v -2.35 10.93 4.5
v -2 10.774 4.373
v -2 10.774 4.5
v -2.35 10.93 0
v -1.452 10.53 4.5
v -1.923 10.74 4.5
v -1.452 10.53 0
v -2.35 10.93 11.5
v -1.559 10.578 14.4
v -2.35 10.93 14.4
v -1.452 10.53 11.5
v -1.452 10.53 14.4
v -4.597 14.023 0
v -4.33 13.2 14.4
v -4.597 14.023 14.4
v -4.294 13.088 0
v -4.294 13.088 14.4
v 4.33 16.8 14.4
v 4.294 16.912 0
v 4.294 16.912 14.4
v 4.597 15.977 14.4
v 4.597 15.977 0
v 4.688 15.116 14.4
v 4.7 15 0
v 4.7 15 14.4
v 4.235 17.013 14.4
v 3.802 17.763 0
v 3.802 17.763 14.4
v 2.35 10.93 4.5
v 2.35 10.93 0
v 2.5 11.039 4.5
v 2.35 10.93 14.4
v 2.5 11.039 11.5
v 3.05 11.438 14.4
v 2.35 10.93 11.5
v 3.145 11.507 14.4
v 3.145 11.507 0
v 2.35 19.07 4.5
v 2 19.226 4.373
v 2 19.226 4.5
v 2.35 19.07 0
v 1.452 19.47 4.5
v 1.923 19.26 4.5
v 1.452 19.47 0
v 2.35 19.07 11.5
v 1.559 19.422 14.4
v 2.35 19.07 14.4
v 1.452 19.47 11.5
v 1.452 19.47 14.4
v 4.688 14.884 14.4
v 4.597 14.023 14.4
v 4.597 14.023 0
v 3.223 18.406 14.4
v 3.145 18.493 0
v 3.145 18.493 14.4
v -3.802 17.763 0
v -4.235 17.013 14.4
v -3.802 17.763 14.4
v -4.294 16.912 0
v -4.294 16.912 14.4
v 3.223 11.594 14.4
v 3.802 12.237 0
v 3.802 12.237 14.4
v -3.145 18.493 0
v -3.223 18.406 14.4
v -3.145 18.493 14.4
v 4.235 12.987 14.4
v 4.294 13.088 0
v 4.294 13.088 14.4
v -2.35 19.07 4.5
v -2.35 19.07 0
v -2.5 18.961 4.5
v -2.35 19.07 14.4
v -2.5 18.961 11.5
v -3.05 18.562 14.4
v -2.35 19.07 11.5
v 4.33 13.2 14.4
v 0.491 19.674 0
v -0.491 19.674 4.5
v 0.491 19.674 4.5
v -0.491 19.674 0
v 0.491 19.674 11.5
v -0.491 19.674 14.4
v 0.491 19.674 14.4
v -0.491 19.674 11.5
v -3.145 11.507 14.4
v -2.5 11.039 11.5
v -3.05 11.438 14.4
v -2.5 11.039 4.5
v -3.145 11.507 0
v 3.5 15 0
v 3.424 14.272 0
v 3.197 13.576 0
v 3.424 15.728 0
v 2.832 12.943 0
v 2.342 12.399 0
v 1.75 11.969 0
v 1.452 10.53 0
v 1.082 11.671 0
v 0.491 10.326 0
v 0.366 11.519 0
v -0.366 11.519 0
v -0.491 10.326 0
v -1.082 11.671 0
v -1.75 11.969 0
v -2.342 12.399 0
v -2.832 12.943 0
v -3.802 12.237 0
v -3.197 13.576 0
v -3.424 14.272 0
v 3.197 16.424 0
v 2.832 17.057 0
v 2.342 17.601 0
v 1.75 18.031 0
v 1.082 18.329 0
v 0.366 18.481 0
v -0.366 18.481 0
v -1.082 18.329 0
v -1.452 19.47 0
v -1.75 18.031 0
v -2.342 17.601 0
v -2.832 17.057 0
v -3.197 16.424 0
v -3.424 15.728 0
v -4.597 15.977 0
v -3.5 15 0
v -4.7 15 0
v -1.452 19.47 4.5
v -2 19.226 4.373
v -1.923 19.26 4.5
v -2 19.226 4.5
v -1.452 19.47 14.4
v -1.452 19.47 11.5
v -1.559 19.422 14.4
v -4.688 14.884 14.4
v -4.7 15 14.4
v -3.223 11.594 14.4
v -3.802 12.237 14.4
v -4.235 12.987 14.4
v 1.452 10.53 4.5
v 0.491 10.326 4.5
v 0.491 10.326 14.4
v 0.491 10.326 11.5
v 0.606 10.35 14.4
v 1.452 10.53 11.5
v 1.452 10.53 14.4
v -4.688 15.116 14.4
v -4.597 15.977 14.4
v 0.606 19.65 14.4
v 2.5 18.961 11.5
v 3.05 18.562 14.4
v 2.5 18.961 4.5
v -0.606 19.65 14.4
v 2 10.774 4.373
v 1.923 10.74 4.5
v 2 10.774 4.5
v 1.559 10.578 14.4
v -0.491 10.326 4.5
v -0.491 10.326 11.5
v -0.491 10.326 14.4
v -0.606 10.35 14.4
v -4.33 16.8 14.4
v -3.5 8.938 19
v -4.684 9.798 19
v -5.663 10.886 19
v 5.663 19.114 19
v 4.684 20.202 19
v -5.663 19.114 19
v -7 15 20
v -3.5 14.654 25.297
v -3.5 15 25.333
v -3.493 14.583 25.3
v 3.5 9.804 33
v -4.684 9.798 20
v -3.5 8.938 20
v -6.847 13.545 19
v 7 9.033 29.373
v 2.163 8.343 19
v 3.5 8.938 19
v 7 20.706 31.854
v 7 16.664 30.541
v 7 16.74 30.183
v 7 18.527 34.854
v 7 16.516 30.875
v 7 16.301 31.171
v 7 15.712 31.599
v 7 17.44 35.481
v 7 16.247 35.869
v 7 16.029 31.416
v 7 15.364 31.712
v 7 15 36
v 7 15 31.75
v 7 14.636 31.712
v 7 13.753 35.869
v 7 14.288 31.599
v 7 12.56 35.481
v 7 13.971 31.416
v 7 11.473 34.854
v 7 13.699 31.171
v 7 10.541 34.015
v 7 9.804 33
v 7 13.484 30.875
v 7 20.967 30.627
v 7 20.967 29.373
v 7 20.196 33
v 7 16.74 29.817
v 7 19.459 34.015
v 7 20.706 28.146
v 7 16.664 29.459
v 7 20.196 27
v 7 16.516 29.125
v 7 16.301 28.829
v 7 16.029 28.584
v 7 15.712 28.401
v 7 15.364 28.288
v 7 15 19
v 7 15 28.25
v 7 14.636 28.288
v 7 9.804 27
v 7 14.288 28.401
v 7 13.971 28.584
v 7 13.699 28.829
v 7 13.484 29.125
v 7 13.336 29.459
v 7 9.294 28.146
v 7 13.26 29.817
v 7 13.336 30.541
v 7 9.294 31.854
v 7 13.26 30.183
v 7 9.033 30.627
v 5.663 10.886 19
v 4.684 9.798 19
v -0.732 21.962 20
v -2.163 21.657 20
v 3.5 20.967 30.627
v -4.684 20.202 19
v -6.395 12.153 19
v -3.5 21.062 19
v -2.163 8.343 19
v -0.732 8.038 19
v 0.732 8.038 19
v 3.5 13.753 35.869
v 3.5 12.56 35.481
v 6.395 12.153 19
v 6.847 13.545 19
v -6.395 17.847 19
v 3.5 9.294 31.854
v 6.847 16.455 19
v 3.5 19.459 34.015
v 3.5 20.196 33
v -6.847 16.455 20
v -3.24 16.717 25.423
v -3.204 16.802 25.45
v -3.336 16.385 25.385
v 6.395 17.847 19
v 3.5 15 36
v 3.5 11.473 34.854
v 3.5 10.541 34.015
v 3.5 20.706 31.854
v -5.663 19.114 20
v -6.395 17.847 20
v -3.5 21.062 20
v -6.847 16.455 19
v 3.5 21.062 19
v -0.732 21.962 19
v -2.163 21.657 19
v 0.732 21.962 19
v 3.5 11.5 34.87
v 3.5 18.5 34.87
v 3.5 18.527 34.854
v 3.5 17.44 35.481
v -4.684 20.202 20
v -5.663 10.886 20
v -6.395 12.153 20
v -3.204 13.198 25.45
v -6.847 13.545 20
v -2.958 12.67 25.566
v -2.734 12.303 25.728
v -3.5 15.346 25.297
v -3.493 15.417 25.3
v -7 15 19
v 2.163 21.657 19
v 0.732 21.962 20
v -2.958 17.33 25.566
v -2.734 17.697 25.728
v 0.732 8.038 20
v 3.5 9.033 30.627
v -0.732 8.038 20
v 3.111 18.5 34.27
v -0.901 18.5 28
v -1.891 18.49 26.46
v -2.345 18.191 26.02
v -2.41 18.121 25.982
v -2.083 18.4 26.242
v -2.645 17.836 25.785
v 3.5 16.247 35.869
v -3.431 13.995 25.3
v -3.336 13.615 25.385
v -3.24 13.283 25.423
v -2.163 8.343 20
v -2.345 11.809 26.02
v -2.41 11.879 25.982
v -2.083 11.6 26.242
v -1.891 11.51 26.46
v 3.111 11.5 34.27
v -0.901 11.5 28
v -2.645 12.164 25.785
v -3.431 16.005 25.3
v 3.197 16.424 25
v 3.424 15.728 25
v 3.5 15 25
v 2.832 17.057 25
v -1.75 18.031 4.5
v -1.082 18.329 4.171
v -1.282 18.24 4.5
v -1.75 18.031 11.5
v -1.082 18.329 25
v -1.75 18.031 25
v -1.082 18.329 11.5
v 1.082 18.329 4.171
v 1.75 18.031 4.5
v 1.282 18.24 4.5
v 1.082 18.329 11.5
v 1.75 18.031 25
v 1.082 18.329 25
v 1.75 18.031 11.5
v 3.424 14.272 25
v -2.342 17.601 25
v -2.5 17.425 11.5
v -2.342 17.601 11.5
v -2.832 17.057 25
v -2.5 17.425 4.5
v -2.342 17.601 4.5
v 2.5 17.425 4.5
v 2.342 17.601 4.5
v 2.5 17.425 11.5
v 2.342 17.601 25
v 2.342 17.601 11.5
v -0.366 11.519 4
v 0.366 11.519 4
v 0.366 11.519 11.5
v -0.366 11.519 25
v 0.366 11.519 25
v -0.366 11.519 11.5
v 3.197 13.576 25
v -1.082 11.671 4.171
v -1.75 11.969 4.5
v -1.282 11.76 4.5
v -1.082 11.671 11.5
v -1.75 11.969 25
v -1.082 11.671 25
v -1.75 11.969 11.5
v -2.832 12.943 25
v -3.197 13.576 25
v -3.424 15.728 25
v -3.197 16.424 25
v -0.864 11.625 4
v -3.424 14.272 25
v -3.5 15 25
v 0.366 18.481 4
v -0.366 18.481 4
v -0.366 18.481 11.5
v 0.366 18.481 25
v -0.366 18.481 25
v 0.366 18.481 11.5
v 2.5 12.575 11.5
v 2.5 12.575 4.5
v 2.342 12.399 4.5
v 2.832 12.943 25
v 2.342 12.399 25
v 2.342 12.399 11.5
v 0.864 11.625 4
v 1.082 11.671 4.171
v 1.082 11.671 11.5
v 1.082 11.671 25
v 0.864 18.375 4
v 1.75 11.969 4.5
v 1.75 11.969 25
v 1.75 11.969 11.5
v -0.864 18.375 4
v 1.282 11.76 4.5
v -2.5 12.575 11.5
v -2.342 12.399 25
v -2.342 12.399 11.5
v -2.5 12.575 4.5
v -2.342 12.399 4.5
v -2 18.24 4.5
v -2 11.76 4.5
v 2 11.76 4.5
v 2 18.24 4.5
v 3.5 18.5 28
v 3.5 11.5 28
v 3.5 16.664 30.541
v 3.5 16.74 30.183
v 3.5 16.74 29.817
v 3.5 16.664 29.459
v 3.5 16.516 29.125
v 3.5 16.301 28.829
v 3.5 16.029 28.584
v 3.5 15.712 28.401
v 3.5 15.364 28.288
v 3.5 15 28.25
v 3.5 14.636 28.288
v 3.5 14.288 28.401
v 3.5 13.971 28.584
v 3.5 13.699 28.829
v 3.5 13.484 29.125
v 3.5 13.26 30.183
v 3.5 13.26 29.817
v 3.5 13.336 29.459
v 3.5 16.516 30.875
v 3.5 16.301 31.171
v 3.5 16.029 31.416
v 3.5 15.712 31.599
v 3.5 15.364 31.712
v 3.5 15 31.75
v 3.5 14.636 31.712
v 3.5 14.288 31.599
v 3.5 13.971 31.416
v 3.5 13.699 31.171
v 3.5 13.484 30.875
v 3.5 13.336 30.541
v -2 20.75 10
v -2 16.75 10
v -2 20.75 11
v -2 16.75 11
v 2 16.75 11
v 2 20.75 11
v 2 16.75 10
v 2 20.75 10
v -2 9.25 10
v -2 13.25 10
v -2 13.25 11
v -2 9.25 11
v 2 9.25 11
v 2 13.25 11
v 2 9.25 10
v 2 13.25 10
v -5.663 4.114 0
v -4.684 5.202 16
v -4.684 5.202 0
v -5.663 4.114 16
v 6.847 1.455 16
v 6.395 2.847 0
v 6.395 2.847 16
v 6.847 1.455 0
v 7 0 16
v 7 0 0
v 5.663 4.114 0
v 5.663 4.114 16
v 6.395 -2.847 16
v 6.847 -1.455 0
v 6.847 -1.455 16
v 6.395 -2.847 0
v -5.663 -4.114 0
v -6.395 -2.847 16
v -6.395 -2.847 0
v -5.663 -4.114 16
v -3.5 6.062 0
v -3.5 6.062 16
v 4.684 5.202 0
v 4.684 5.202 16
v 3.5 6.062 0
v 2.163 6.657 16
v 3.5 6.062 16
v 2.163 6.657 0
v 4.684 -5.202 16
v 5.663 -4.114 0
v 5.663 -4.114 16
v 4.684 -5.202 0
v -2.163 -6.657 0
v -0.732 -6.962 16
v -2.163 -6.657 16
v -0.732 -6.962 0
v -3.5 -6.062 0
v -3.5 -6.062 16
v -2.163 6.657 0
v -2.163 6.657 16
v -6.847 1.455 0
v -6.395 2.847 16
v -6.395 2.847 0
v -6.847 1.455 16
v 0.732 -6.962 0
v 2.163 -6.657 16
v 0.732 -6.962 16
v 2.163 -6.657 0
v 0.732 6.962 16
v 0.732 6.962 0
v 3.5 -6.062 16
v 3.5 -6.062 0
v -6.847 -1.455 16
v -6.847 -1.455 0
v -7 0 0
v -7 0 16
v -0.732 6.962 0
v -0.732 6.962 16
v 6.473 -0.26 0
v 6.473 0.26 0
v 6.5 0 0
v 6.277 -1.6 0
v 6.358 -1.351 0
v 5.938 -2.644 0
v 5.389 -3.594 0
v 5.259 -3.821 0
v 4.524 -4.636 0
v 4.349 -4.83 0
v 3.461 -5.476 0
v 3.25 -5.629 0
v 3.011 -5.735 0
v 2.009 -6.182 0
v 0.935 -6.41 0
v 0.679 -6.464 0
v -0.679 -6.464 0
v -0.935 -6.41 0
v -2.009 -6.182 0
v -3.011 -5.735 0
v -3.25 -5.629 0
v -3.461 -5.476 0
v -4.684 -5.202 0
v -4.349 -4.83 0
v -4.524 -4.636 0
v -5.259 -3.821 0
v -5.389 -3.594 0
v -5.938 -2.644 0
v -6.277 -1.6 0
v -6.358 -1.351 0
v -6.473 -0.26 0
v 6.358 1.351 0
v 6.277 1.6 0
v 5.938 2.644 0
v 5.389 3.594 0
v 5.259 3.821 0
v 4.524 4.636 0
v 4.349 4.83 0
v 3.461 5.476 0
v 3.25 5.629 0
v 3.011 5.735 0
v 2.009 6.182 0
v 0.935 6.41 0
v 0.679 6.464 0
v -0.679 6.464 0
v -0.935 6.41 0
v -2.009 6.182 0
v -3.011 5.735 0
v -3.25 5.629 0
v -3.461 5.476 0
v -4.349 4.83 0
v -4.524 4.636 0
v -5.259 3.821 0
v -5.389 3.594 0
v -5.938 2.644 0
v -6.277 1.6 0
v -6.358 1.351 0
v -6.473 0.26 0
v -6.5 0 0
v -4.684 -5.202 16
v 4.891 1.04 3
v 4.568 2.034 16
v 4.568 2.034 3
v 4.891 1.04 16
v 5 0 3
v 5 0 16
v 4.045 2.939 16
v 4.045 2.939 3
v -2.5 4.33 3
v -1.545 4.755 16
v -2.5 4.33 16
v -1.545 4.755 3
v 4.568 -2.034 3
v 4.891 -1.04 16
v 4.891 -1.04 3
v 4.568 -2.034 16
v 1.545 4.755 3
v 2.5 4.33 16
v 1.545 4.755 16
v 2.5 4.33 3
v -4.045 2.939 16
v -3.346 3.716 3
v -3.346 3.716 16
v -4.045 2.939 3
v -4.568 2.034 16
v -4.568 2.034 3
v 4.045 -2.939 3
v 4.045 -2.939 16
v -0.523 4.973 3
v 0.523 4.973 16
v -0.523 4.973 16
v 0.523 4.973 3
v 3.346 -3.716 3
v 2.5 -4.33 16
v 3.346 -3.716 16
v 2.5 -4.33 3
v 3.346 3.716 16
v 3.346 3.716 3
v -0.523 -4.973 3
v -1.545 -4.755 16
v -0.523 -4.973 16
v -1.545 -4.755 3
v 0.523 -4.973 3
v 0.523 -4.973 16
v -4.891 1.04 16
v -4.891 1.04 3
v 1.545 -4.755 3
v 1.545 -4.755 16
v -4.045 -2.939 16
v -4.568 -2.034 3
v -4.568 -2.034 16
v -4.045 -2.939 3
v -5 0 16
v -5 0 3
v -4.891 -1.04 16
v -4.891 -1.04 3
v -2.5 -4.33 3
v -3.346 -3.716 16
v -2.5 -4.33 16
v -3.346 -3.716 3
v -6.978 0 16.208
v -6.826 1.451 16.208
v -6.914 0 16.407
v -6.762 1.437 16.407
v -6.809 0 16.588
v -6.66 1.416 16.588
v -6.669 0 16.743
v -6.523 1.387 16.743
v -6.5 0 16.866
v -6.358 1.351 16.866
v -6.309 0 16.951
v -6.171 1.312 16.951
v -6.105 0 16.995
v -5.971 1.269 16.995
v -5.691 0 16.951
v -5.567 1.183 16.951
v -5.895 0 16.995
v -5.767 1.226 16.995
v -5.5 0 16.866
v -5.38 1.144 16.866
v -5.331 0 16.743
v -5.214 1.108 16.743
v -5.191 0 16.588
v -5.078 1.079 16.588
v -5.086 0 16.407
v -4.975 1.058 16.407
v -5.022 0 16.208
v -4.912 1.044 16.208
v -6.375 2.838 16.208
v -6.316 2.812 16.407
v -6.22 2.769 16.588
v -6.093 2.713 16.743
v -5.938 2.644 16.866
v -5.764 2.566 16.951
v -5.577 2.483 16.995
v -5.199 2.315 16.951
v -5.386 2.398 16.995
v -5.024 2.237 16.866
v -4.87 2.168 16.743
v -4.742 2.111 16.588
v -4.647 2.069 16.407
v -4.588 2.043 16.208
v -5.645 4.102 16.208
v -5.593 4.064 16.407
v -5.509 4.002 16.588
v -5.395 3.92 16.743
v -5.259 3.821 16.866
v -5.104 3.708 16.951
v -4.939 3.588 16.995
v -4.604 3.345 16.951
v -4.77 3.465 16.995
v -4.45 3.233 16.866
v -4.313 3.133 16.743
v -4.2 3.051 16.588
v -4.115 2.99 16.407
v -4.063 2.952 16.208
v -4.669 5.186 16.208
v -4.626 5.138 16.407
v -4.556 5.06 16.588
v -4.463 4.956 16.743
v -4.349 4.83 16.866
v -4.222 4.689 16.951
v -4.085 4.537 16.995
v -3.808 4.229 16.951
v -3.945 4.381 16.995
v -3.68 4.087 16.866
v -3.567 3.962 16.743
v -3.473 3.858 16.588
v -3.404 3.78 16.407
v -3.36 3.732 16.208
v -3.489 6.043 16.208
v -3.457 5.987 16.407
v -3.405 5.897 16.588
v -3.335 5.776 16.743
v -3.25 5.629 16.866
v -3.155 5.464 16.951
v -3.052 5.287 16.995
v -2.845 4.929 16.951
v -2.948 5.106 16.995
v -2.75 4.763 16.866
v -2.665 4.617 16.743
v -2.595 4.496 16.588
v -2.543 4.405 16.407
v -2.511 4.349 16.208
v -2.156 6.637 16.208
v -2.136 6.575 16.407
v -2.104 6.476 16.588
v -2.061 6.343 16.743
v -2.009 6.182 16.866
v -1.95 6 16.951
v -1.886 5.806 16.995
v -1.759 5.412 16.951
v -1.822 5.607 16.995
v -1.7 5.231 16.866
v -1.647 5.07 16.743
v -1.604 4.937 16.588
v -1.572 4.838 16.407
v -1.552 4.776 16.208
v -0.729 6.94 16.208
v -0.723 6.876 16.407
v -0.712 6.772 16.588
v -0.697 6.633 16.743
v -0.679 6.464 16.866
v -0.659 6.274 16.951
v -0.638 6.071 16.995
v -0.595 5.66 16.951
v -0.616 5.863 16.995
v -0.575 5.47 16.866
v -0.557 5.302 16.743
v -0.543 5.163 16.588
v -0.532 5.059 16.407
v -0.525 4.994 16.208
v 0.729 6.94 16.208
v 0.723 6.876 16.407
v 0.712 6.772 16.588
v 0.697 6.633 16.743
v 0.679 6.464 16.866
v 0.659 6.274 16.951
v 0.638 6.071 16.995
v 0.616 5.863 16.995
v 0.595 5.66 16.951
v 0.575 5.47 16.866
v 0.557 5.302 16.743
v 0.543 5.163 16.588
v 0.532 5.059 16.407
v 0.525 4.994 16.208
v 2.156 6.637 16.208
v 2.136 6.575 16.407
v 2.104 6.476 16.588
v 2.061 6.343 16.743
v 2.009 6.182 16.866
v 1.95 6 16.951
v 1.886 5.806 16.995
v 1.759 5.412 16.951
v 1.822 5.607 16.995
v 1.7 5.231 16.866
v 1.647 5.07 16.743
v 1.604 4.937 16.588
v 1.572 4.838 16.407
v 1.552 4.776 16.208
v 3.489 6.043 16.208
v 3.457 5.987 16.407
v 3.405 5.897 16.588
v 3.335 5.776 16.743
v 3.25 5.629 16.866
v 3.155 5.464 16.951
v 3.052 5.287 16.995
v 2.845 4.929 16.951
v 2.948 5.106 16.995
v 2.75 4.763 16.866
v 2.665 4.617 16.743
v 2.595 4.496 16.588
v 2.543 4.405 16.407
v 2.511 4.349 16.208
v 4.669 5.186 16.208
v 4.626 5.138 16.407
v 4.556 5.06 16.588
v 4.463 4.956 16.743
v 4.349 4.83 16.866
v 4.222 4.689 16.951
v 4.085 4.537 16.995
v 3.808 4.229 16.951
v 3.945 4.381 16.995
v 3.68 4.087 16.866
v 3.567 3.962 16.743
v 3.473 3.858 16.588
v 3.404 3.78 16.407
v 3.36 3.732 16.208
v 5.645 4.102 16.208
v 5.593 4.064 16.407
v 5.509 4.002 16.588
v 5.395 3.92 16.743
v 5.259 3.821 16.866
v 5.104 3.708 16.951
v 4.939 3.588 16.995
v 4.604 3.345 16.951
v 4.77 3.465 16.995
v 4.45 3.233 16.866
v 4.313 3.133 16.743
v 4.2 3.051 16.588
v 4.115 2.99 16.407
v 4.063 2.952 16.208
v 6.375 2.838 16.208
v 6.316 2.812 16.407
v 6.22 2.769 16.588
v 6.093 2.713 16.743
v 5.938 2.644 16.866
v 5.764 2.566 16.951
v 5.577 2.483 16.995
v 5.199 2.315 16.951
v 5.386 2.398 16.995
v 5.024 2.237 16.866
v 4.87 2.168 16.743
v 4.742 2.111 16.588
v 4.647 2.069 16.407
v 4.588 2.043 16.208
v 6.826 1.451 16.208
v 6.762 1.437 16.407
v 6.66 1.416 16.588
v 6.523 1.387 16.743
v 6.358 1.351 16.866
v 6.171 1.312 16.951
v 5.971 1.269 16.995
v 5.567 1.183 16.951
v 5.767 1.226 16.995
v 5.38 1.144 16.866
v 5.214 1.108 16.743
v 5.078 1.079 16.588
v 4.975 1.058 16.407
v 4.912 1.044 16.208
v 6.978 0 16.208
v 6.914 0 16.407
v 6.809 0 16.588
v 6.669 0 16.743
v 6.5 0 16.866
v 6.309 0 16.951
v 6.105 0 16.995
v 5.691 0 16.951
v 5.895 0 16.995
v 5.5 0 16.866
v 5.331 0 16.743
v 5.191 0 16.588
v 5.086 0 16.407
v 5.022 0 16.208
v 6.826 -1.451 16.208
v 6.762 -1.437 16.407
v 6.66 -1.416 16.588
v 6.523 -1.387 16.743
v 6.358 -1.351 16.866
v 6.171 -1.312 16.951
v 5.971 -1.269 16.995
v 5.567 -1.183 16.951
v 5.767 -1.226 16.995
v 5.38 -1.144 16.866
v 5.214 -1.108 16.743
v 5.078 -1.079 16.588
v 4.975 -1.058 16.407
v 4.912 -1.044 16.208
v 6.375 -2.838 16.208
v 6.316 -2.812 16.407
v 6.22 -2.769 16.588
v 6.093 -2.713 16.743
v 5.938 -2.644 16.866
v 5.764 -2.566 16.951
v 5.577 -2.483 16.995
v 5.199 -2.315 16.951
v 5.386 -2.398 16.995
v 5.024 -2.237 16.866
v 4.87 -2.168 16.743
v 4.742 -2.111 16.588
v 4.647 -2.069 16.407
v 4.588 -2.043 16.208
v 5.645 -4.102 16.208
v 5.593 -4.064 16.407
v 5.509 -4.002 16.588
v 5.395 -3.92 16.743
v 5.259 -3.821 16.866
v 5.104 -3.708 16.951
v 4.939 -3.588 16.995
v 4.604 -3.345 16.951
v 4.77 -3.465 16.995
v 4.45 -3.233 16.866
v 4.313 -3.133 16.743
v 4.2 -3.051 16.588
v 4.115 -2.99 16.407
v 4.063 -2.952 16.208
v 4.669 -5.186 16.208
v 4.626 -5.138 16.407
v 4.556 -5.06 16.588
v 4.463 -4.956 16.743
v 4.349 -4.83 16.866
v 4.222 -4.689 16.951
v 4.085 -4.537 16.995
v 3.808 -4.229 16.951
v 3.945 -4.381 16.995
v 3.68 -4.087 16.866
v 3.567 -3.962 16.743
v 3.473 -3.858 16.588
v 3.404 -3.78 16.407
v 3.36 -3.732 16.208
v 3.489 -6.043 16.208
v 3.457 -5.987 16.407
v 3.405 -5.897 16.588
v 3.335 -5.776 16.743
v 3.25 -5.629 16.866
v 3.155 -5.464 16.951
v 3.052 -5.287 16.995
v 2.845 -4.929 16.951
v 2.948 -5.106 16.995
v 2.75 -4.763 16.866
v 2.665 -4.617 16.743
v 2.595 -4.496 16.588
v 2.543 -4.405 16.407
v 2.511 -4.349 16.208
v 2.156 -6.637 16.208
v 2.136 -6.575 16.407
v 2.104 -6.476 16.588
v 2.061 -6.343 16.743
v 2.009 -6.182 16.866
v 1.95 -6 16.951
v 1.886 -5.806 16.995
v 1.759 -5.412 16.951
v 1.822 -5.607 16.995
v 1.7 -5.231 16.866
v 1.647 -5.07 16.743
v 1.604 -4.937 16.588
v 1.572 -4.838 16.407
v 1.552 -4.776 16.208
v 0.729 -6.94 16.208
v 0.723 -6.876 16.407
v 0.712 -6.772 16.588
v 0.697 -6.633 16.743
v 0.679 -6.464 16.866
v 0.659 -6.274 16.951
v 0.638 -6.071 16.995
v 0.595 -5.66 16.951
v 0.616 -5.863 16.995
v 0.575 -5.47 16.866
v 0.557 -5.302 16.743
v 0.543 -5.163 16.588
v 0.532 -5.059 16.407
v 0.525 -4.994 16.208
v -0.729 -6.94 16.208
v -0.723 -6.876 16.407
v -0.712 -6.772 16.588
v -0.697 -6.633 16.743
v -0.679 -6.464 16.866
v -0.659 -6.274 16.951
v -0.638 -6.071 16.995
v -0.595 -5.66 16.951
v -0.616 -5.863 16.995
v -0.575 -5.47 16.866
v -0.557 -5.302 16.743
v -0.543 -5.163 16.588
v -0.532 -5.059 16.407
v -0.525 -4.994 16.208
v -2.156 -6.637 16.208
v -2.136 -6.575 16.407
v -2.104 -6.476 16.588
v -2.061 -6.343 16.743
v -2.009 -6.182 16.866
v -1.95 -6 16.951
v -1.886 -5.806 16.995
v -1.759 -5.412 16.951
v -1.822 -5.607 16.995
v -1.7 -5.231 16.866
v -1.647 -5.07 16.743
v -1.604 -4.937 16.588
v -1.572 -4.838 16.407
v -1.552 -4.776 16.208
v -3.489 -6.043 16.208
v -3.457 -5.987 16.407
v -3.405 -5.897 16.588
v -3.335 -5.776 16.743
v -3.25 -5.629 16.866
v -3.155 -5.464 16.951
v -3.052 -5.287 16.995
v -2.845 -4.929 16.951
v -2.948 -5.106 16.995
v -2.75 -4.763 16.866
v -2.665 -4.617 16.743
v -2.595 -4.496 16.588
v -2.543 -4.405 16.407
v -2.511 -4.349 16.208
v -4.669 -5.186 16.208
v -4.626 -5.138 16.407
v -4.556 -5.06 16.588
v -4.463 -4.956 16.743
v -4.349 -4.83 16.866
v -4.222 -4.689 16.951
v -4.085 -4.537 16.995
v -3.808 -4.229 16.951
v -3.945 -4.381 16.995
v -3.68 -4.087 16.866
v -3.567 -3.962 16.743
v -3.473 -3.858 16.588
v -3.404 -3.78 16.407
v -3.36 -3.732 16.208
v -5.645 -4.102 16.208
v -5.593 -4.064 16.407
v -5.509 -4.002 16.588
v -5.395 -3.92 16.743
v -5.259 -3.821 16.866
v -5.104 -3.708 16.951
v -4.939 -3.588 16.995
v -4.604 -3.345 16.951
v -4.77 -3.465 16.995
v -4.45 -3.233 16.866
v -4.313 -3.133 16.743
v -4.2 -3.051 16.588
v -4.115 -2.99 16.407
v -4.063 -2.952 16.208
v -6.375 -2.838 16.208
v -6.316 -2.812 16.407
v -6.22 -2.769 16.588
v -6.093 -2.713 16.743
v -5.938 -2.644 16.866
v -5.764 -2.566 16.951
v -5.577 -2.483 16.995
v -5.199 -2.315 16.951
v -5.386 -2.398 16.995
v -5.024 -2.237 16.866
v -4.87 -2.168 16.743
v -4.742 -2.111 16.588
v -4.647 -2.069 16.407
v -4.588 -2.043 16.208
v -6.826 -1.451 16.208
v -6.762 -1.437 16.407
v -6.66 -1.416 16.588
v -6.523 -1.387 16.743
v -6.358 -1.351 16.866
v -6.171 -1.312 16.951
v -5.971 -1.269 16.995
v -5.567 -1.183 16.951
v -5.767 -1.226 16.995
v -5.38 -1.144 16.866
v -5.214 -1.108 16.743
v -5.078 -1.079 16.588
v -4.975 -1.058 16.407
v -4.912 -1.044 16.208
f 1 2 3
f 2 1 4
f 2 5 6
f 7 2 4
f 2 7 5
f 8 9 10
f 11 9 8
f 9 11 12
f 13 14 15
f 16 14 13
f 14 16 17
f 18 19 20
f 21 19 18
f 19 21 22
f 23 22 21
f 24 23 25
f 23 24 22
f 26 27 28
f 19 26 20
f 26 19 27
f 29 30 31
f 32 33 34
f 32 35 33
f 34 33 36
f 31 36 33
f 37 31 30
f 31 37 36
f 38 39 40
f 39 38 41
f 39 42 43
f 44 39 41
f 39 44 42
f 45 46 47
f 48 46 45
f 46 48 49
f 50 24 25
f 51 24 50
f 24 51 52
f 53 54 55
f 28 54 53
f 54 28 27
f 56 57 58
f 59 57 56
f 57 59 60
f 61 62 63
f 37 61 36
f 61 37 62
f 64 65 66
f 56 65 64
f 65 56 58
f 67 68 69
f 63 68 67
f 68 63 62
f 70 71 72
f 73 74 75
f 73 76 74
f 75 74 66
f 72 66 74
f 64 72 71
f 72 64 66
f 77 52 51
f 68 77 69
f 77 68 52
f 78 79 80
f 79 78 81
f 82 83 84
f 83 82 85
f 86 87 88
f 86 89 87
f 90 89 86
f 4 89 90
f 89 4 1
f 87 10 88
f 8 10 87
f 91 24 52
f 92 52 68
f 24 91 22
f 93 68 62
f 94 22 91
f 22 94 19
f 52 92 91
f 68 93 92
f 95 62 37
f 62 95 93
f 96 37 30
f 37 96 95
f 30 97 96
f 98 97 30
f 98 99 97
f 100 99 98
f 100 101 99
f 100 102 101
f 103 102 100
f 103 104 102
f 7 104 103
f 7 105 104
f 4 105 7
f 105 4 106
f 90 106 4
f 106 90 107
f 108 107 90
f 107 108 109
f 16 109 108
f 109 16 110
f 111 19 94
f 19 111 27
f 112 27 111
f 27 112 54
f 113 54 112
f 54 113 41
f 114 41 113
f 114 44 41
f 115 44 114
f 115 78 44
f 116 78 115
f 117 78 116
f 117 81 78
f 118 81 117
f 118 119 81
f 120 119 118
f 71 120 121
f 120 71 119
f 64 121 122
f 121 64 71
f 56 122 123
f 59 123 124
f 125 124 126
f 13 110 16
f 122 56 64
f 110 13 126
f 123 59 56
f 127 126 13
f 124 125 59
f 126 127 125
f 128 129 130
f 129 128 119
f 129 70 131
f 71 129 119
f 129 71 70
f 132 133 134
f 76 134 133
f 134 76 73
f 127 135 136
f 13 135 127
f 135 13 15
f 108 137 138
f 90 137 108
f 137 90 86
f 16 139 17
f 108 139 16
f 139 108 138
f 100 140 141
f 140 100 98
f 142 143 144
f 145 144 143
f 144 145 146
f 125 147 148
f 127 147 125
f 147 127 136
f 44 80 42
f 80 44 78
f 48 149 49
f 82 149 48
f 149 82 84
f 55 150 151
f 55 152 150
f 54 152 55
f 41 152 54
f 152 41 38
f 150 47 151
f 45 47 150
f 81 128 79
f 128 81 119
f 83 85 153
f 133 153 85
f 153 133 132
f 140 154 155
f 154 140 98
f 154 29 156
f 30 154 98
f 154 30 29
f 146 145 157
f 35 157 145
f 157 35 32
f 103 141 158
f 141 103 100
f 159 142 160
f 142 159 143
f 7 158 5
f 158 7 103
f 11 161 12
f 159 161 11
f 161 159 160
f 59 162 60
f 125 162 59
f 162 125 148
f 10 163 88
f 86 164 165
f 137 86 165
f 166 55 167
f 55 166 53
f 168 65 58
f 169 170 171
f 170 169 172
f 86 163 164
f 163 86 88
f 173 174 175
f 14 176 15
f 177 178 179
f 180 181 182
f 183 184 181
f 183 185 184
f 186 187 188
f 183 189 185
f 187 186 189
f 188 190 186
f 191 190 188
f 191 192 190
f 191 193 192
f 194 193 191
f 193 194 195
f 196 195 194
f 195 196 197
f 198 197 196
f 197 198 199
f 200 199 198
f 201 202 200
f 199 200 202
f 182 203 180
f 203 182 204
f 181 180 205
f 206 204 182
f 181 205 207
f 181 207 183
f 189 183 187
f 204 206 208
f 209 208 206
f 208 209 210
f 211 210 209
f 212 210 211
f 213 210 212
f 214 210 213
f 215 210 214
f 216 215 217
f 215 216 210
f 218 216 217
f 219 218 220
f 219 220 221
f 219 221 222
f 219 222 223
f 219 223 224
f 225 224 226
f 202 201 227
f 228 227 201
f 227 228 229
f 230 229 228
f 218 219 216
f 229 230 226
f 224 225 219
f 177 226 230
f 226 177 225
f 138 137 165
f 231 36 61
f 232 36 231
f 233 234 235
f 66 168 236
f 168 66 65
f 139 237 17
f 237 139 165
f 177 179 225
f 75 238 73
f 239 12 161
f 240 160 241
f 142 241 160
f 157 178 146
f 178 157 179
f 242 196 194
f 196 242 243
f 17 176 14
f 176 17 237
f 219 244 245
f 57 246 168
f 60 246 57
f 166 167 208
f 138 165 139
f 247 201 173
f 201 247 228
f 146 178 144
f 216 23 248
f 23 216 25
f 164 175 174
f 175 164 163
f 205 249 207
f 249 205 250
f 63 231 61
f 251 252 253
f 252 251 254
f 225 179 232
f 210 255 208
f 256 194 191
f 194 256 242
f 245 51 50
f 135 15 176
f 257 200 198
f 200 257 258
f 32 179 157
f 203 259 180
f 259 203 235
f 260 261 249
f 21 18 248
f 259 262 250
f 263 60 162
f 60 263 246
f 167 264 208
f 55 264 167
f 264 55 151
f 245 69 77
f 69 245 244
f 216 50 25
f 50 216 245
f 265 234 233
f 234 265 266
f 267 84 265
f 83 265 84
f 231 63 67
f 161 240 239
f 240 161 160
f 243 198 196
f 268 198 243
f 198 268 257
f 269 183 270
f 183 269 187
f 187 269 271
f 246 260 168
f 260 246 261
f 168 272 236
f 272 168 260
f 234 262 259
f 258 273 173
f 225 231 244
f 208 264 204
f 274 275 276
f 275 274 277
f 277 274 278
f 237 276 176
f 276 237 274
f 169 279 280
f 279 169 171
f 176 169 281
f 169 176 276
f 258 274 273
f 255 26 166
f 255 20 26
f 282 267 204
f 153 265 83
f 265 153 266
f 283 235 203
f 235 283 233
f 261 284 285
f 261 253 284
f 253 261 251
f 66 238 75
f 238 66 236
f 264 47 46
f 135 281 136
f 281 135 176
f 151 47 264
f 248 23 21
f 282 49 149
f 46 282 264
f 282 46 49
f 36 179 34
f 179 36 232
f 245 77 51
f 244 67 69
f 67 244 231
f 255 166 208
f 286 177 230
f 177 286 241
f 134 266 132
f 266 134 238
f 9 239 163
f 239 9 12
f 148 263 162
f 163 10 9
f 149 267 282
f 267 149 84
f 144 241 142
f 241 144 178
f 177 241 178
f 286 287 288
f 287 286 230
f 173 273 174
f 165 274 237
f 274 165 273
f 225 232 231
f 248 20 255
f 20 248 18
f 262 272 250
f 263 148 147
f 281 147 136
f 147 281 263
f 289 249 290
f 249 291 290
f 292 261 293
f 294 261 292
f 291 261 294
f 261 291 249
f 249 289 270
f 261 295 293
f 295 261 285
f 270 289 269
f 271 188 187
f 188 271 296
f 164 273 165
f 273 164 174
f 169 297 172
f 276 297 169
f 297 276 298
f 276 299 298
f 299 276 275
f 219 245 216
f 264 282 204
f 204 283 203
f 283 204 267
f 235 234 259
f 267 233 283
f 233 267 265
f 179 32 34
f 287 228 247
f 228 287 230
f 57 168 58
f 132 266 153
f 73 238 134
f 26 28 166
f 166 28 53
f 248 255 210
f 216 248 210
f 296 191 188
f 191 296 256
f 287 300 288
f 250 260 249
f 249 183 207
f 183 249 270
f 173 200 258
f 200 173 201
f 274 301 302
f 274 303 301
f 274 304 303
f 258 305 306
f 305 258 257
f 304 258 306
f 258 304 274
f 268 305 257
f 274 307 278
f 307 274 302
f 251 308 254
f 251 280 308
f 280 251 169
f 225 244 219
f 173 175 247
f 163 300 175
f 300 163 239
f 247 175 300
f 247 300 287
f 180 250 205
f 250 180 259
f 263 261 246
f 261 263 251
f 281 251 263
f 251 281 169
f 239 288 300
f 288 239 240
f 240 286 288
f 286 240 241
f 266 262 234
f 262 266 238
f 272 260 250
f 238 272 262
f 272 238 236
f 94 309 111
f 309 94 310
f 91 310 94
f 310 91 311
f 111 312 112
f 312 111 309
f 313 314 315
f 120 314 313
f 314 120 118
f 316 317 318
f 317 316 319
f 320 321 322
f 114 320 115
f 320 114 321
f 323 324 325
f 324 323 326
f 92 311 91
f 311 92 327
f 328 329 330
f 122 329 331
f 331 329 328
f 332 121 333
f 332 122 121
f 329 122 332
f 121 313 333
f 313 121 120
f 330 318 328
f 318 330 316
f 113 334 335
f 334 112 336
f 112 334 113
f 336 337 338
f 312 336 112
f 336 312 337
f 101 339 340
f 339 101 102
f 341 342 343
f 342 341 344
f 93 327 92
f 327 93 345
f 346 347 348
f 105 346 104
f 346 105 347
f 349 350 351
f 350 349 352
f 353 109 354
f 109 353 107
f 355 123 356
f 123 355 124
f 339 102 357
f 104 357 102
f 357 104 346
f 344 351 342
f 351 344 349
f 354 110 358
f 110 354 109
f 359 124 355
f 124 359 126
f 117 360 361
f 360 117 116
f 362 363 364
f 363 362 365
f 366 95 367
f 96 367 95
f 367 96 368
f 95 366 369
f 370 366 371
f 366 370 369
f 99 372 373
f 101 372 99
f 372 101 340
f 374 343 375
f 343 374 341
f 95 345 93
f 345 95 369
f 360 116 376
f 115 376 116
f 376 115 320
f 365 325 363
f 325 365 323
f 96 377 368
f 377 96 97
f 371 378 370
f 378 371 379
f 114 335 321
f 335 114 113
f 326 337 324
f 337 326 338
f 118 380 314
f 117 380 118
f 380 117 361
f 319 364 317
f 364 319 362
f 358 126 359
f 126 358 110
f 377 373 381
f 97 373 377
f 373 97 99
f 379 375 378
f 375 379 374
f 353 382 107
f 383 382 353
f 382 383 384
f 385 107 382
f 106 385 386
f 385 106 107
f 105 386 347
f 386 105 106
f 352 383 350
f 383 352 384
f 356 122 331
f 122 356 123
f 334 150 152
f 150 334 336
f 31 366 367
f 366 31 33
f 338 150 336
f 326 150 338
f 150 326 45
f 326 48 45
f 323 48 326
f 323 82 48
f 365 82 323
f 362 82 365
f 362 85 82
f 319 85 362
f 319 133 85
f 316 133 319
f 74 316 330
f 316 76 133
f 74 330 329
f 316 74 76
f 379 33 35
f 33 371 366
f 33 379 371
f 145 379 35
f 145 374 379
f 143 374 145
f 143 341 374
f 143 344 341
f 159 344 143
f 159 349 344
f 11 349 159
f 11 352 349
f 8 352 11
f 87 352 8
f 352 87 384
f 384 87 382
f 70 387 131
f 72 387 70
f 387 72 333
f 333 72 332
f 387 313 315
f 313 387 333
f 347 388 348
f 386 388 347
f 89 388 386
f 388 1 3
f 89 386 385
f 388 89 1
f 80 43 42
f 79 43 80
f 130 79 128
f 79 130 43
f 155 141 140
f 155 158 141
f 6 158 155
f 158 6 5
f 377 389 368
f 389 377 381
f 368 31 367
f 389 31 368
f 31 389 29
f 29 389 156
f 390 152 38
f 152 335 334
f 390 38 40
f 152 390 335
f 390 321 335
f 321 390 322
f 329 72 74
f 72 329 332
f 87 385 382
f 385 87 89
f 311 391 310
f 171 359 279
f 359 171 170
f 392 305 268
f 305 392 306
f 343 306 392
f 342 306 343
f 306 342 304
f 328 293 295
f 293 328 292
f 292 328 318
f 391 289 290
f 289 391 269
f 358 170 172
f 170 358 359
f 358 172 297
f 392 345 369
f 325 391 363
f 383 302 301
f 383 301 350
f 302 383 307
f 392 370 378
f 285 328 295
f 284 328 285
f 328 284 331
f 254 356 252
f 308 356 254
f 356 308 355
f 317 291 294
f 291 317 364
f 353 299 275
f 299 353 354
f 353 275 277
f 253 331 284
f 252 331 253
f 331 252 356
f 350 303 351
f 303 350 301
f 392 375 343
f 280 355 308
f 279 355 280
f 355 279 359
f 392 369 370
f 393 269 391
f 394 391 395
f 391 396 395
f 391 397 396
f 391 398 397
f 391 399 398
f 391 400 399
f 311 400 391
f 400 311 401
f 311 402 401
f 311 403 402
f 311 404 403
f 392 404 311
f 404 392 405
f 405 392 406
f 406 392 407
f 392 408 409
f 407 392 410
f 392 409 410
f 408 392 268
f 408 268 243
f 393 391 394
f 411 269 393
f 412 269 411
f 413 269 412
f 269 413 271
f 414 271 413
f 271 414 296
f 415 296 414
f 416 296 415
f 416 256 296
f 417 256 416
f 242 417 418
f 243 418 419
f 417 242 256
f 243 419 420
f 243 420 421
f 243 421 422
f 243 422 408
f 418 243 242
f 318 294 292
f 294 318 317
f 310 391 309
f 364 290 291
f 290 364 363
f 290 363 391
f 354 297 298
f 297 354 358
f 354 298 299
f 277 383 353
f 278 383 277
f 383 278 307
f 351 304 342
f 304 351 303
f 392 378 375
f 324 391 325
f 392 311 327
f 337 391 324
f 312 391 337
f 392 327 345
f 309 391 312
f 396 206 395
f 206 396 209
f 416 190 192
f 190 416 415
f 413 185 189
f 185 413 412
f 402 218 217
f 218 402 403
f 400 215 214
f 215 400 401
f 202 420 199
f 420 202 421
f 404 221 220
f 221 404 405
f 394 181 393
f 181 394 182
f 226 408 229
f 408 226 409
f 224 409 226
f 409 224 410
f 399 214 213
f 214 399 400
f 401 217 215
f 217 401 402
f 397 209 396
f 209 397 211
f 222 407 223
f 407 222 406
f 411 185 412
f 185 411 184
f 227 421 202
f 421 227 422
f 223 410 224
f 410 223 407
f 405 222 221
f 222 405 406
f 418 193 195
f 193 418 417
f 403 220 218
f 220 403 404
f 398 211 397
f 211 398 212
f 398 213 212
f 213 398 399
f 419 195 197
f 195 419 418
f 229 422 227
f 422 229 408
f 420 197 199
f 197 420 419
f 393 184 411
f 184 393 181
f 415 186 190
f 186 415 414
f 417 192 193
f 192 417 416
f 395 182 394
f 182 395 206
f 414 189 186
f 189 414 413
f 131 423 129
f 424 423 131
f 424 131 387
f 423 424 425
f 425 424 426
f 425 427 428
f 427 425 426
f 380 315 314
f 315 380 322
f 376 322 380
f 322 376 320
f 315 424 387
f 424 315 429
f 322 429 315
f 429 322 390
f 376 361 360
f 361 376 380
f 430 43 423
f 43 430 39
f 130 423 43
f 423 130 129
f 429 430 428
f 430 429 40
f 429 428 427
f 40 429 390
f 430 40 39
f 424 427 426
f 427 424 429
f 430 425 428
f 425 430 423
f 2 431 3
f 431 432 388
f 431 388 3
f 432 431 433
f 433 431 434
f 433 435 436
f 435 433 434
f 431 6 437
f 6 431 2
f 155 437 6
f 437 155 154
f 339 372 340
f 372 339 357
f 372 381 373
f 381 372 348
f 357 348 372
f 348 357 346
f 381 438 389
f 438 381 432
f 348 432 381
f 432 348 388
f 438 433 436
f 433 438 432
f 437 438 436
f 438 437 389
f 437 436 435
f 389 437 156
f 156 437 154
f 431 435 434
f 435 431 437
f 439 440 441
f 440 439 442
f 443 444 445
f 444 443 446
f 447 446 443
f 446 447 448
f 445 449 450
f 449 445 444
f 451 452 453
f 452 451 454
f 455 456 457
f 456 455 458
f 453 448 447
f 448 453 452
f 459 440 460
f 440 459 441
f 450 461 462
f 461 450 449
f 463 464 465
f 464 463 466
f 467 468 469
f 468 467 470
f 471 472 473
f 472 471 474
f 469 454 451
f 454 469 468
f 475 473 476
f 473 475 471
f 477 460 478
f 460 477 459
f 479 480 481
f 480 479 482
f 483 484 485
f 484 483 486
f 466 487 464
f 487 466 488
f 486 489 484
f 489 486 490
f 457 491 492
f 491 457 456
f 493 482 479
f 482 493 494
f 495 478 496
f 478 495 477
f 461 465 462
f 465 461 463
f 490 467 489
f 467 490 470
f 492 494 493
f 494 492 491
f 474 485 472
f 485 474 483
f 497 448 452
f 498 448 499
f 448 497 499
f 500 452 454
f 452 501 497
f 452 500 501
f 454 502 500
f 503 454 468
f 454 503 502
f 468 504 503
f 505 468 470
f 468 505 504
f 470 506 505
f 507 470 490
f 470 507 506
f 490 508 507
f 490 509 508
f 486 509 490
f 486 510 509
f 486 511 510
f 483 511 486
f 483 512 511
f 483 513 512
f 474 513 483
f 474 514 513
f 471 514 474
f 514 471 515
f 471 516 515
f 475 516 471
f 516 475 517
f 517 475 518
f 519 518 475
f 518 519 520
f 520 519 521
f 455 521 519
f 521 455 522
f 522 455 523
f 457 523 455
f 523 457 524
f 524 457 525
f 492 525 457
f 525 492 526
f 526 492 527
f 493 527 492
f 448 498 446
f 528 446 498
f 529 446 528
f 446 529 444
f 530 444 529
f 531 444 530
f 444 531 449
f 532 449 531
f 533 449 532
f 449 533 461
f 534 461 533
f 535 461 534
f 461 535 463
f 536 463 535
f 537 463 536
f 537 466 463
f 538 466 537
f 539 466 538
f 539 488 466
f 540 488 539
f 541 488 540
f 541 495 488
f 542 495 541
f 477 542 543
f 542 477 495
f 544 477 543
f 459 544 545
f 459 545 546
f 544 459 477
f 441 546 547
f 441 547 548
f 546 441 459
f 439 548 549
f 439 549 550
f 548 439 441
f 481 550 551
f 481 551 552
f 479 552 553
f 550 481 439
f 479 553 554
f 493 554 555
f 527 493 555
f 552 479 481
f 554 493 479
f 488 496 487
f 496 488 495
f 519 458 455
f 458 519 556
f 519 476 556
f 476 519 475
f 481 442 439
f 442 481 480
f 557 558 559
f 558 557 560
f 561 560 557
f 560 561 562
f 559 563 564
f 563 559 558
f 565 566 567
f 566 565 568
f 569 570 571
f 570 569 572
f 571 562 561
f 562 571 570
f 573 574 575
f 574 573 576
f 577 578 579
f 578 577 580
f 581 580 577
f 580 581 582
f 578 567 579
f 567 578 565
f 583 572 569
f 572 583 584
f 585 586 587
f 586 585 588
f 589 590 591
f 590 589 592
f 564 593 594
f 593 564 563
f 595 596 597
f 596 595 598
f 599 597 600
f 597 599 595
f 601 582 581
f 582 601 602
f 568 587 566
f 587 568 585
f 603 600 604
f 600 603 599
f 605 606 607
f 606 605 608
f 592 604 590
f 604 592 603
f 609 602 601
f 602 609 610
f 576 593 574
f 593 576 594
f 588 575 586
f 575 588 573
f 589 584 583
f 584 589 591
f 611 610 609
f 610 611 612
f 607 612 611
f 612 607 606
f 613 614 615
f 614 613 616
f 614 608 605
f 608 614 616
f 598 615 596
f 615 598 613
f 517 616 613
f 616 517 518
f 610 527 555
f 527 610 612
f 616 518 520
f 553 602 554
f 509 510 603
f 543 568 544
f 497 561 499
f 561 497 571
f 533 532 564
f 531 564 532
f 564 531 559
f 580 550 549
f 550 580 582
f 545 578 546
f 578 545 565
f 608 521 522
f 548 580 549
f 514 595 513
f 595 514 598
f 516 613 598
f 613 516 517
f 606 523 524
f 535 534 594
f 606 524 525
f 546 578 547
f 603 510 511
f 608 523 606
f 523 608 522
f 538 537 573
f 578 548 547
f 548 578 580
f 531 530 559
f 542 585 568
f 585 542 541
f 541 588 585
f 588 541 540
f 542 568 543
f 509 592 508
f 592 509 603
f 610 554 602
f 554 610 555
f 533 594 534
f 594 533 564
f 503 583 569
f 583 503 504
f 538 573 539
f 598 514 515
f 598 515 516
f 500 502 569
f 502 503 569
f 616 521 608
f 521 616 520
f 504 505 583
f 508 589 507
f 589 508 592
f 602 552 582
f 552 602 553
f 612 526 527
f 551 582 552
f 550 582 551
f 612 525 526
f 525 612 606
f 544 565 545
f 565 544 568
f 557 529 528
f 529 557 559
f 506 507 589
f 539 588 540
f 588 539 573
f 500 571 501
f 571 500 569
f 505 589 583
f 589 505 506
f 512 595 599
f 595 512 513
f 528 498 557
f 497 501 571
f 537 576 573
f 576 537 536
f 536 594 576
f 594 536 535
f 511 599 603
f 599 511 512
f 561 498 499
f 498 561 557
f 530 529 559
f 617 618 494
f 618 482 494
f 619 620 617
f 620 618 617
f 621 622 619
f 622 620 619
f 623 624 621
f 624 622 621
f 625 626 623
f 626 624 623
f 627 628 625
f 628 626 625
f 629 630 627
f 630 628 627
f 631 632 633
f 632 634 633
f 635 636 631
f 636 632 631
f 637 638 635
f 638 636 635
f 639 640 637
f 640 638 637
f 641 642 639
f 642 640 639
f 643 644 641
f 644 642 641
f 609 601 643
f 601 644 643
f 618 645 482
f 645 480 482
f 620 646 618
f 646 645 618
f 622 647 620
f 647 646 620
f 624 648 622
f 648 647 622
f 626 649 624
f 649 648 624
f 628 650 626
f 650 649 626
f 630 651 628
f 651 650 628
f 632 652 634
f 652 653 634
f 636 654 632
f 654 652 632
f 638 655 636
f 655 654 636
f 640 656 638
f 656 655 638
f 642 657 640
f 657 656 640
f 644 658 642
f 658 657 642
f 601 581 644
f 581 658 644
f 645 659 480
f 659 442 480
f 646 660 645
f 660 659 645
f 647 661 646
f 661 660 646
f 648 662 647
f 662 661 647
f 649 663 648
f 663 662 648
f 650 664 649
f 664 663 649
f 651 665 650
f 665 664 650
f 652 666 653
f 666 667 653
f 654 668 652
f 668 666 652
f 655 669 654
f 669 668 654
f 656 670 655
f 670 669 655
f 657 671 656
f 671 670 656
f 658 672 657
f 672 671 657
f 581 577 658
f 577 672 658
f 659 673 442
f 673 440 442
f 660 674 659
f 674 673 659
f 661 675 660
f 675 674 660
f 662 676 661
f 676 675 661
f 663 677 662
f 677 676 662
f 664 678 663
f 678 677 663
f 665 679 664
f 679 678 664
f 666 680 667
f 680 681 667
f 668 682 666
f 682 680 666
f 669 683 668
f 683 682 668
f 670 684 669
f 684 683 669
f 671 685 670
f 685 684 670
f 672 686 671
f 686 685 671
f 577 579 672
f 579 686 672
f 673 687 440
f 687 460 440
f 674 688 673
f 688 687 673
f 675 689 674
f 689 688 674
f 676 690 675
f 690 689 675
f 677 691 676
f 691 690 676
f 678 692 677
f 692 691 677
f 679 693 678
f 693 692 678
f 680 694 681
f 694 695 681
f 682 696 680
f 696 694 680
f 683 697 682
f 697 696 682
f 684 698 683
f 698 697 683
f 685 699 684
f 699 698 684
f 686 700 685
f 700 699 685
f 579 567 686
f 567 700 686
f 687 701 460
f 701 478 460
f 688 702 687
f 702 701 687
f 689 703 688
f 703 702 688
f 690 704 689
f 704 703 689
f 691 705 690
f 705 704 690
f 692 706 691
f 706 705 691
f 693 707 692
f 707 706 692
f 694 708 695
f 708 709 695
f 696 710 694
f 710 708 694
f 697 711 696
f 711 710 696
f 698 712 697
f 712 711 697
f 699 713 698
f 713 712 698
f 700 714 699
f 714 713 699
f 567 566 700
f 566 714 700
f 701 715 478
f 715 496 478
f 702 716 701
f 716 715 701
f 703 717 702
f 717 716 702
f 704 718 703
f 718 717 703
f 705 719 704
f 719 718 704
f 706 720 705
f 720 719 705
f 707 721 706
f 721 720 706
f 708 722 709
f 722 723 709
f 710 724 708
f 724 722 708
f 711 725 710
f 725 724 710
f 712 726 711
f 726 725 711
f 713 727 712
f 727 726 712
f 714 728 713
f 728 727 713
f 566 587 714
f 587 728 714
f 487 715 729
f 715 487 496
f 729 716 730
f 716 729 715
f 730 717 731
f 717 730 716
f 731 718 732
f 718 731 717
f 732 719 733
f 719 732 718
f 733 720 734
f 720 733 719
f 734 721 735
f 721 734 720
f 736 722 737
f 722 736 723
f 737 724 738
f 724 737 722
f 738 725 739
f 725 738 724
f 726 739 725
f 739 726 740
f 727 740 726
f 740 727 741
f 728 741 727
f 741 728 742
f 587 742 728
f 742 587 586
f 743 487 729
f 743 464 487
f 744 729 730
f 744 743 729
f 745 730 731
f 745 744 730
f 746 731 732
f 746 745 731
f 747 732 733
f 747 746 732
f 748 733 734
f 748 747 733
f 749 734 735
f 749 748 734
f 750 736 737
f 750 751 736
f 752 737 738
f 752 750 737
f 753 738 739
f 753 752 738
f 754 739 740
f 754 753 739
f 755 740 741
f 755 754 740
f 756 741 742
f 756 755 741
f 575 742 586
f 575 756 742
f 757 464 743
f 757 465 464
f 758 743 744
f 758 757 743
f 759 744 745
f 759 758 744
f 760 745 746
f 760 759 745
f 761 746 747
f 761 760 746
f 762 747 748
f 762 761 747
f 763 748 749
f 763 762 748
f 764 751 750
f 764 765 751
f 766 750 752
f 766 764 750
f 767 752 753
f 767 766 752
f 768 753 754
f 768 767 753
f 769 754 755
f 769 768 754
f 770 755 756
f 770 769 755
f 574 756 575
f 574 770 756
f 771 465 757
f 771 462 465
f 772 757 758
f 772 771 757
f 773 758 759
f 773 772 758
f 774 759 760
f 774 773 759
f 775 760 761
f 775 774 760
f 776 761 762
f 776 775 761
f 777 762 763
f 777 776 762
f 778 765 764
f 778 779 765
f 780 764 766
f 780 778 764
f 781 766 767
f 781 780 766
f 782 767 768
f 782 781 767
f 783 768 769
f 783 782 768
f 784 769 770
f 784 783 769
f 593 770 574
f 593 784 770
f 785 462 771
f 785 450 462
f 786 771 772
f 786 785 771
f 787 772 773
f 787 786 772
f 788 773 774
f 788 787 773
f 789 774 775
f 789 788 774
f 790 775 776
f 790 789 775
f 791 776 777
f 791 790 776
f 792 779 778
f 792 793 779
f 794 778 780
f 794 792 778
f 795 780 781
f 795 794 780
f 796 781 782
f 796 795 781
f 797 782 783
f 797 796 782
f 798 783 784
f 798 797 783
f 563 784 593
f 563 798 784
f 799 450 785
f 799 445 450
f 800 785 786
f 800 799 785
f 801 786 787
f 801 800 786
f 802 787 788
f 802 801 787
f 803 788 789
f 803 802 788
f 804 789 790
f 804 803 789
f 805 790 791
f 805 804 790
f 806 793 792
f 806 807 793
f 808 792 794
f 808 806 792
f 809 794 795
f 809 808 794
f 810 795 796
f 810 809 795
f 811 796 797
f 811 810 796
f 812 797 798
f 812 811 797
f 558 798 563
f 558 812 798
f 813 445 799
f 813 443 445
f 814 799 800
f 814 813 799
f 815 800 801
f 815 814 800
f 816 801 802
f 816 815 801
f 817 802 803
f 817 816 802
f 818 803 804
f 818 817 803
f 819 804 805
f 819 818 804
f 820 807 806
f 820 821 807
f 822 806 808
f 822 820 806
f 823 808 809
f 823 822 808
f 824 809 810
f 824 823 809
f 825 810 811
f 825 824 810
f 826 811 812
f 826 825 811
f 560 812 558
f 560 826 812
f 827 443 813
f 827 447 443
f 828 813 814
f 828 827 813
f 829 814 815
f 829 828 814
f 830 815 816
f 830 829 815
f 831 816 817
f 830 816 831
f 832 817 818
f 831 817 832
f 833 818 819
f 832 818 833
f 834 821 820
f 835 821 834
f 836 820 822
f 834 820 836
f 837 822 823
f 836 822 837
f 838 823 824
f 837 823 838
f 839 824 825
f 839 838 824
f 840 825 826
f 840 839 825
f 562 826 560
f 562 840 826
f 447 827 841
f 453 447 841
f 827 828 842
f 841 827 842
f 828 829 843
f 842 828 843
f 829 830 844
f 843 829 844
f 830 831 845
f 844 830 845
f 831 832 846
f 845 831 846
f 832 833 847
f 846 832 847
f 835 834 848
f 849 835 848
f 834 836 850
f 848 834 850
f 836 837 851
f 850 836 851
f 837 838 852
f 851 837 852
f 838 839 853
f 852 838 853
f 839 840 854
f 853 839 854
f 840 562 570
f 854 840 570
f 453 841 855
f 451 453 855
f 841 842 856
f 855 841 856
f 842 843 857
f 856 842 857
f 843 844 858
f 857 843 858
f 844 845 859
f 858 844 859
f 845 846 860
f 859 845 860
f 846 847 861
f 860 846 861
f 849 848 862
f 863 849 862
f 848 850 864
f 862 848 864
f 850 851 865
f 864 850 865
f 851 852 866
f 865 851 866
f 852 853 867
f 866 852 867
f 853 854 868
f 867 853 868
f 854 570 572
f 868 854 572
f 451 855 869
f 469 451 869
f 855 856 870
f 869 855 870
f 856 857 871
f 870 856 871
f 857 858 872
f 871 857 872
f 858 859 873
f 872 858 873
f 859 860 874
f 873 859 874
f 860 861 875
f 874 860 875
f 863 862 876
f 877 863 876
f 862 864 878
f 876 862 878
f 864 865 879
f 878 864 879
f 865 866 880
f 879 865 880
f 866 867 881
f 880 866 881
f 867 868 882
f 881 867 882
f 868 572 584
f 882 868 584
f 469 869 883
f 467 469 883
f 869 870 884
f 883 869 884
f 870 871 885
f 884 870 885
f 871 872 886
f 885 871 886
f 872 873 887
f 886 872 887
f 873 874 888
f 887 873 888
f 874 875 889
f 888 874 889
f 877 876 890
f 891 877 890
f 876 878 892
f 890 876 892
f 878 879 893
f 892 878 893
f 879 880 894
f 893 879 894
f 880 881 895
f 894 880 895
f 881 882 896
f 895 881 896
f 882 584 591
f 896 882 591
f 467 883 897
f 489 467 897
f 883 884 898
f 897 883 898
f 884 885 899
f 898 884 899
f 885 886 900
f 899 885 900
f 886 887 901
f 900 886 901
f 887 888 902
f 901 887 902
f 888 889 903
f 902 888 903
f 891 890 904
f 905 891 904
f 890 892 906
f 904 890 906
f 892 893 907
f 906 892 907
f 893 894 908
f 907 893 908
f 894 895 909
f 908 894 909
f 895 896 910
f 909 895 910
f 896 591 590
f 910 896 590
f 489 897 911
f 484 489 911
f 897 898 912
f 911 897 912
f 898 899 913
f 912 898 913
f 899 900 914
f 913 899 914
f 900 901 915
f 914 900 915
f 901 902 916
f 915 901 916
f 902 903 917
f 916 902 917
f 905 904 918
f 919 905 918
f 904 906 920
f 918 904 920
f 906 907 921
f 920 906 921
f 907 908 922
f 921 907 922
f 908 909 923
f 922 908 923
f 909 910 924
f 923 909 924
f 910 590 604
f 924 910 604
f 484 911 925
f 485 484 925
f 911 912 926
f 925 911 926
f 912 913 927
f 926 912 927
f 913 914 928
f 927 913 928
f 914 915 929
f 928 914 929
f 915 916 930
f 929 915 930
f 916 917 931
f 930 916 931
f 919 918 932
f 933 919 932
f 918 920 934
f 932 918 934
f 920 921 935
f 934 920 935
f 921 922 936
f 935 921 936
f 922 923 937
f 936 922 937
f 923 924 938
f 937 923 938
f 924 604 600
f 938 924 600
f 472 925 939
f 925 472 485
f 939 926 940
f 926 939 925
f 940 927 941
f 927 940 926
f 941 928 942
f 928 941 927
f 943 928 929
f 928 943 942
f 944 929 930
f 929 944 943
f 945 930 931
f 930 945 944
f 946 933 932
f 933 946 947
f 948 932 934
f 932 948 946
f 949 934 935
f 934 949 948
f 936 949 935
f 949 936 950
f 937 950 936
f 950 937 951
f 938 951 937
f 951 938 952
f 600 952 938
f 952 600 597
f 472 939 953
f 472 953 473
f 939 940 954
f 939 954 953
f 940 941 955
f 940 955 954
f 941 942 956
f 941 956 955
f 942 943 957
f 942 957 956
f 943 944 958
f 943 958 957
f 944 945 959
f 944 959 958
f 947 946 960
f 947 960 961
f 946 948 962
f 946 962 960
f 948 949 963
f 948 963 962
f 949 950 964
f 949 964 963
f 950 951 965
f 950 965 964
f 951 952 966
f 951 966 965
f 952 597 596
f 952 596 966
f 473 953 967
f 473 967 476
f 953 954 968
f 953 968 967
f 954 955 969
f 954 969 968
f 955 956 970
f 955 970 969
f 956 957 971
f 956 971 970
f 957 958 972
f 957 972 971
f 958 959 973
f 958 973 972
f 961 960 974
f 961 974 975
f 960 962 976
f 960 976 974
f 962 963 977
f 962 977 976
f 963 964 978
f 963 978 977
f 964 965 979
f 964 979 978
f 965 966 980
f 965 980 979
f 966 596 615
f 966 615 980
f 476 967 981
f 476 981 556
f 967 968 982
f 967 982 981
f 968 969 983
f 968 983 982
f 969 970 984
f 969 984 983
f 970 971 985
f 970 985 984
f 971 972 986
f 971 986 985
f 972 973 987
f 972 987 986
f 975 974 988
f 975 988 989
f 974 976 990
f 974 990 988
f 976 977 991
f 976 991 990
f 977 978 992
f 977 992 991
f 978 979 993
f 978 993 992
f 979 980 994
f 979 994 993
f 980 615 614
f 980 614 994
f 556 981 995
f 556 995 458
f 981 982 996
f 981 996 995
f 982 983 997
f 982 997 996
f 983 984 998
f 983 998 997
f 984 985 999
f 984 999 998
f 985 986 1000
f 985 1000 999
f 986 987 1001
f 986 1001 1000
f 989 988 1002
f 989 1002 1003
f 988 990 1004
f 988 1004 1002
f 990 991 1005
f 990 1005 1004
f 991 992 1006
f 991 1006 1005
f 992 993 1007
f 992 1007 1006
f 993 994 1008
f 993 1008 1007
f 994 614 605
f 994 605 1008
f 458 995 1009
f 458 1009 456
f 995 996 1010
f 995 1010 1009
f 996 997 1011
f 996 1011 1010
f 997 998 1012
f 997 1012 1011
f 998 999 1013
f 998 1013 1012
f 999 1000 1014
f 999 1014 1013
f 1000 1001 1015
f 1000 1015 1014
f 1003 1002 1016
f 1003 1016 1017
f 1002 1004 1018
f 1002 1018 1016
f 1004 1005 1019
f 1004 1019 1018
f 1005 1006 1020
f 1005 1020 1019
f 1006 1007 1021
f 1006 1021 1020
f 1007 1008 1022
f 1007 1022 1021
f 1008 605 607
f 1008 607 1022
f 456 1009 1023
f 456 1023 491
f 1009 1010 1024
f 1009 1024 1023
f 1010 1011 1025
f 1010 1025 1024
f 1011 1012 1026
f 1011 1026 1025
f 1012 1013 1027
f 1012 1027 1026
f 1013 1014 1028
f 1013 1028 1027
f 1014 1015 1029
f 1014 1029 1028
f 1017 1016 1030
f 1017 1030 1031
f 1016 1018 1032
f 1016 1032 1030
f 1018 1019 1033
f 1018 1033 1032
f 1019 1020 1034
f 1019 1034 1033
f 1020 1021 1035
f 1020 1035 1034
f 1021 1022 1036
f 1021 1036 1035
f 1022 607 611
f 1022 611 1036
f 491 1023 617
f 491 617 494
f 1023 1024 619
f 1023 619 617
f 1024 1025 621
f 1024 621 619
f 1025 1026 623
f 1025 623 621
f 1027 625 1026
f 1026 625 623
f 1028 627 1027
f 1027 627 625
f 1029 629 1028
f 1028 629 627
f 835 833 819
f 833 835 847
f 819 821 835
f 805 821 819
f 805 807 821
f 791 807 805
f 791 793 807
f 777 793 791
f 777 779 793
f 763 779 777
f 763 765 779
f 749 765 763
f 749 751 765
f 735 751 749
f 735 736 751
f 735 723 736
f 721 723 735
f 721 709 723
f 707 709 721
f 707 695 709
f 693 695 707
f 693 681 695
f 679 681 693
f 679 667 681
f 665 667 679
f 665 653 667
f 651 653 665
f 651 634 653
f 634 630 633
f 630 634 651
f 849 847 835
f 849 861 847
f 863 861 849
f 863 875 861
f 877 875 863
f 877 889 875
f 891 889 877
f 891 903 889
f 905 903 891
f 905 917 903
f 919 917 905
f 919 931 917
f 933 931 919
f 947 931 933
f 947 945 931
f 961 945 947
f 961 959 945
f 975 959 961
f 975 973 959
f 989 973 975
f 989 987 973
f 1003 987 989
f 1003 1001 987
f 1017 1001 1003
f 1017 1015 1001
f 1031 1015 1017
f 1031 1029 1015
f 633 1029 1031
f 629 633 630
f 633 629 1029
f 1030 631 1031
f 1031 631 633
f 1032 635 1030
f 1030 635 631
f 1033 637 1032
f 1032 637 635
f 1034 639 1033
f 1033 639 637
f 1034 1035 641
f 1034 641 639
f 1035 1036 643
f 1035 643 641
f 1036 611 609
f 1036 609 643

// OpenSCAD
$fn=30;

module torus(external_radius,internal_radius){
    circle_radius = (external_radius-internal_radius)/2;
    rotate_extrude(angle = 360, convexity = 2) 
        translate([internal_radius+circle_radius,0,0]) circle(r=circle_radius);
}
module ring(){
    difference(){
        cylinder(r=7,h=16);
        translate([0,0,-1]) cylinder(r=5,h=22);
        hull(){
            translate([0,0,-2]) cylinder(r=7,h=1);
            translate([0,0,2]) cylinder(r=5,h=1);
        }
    }
    translate([0,0,16]) torus(7,5);
}

module rope_insert(){
    difference(){
        union(){
            cylinder(r=4.7,h=20);
            hull(){
                translate([0,0,19]) 
                    cylinder(r=7,h=1);
                translate([0,0,14]) 
                    cylinder(r=4.5,h=1);

                translate([3.5,0,30]) 
                    rotate([0,90,0]) 
                    cylinder(r=6,h=3.5);
            }
        }
        translate([0,0,-1]) cylinder(r=3.5,h=40);
        translate([0,0,8]) cube([5,10,7],center=true);
        hull(){
            translate([0,0,25]) cylinder(r=3.5,h=1);
            translate([0,0,38])cube([7,7,20],center=true);
        }
        translate([0,0,30]) rotate([0,90,0]) cylinder(r=1.75,h=10);
    }
    translate([0,3.75,4.5]) flap();
    translate([0,-3.75,4.5]) flap();
}
module flap(){
    hull(){
        translate([0,0,6]) cube([4,4,1],center=true);
        translate([0,0,0.5]) cube([4,0.75,2],center=true);
    }
}

        translate([0,15,0])  rope_insert();
        ring();
